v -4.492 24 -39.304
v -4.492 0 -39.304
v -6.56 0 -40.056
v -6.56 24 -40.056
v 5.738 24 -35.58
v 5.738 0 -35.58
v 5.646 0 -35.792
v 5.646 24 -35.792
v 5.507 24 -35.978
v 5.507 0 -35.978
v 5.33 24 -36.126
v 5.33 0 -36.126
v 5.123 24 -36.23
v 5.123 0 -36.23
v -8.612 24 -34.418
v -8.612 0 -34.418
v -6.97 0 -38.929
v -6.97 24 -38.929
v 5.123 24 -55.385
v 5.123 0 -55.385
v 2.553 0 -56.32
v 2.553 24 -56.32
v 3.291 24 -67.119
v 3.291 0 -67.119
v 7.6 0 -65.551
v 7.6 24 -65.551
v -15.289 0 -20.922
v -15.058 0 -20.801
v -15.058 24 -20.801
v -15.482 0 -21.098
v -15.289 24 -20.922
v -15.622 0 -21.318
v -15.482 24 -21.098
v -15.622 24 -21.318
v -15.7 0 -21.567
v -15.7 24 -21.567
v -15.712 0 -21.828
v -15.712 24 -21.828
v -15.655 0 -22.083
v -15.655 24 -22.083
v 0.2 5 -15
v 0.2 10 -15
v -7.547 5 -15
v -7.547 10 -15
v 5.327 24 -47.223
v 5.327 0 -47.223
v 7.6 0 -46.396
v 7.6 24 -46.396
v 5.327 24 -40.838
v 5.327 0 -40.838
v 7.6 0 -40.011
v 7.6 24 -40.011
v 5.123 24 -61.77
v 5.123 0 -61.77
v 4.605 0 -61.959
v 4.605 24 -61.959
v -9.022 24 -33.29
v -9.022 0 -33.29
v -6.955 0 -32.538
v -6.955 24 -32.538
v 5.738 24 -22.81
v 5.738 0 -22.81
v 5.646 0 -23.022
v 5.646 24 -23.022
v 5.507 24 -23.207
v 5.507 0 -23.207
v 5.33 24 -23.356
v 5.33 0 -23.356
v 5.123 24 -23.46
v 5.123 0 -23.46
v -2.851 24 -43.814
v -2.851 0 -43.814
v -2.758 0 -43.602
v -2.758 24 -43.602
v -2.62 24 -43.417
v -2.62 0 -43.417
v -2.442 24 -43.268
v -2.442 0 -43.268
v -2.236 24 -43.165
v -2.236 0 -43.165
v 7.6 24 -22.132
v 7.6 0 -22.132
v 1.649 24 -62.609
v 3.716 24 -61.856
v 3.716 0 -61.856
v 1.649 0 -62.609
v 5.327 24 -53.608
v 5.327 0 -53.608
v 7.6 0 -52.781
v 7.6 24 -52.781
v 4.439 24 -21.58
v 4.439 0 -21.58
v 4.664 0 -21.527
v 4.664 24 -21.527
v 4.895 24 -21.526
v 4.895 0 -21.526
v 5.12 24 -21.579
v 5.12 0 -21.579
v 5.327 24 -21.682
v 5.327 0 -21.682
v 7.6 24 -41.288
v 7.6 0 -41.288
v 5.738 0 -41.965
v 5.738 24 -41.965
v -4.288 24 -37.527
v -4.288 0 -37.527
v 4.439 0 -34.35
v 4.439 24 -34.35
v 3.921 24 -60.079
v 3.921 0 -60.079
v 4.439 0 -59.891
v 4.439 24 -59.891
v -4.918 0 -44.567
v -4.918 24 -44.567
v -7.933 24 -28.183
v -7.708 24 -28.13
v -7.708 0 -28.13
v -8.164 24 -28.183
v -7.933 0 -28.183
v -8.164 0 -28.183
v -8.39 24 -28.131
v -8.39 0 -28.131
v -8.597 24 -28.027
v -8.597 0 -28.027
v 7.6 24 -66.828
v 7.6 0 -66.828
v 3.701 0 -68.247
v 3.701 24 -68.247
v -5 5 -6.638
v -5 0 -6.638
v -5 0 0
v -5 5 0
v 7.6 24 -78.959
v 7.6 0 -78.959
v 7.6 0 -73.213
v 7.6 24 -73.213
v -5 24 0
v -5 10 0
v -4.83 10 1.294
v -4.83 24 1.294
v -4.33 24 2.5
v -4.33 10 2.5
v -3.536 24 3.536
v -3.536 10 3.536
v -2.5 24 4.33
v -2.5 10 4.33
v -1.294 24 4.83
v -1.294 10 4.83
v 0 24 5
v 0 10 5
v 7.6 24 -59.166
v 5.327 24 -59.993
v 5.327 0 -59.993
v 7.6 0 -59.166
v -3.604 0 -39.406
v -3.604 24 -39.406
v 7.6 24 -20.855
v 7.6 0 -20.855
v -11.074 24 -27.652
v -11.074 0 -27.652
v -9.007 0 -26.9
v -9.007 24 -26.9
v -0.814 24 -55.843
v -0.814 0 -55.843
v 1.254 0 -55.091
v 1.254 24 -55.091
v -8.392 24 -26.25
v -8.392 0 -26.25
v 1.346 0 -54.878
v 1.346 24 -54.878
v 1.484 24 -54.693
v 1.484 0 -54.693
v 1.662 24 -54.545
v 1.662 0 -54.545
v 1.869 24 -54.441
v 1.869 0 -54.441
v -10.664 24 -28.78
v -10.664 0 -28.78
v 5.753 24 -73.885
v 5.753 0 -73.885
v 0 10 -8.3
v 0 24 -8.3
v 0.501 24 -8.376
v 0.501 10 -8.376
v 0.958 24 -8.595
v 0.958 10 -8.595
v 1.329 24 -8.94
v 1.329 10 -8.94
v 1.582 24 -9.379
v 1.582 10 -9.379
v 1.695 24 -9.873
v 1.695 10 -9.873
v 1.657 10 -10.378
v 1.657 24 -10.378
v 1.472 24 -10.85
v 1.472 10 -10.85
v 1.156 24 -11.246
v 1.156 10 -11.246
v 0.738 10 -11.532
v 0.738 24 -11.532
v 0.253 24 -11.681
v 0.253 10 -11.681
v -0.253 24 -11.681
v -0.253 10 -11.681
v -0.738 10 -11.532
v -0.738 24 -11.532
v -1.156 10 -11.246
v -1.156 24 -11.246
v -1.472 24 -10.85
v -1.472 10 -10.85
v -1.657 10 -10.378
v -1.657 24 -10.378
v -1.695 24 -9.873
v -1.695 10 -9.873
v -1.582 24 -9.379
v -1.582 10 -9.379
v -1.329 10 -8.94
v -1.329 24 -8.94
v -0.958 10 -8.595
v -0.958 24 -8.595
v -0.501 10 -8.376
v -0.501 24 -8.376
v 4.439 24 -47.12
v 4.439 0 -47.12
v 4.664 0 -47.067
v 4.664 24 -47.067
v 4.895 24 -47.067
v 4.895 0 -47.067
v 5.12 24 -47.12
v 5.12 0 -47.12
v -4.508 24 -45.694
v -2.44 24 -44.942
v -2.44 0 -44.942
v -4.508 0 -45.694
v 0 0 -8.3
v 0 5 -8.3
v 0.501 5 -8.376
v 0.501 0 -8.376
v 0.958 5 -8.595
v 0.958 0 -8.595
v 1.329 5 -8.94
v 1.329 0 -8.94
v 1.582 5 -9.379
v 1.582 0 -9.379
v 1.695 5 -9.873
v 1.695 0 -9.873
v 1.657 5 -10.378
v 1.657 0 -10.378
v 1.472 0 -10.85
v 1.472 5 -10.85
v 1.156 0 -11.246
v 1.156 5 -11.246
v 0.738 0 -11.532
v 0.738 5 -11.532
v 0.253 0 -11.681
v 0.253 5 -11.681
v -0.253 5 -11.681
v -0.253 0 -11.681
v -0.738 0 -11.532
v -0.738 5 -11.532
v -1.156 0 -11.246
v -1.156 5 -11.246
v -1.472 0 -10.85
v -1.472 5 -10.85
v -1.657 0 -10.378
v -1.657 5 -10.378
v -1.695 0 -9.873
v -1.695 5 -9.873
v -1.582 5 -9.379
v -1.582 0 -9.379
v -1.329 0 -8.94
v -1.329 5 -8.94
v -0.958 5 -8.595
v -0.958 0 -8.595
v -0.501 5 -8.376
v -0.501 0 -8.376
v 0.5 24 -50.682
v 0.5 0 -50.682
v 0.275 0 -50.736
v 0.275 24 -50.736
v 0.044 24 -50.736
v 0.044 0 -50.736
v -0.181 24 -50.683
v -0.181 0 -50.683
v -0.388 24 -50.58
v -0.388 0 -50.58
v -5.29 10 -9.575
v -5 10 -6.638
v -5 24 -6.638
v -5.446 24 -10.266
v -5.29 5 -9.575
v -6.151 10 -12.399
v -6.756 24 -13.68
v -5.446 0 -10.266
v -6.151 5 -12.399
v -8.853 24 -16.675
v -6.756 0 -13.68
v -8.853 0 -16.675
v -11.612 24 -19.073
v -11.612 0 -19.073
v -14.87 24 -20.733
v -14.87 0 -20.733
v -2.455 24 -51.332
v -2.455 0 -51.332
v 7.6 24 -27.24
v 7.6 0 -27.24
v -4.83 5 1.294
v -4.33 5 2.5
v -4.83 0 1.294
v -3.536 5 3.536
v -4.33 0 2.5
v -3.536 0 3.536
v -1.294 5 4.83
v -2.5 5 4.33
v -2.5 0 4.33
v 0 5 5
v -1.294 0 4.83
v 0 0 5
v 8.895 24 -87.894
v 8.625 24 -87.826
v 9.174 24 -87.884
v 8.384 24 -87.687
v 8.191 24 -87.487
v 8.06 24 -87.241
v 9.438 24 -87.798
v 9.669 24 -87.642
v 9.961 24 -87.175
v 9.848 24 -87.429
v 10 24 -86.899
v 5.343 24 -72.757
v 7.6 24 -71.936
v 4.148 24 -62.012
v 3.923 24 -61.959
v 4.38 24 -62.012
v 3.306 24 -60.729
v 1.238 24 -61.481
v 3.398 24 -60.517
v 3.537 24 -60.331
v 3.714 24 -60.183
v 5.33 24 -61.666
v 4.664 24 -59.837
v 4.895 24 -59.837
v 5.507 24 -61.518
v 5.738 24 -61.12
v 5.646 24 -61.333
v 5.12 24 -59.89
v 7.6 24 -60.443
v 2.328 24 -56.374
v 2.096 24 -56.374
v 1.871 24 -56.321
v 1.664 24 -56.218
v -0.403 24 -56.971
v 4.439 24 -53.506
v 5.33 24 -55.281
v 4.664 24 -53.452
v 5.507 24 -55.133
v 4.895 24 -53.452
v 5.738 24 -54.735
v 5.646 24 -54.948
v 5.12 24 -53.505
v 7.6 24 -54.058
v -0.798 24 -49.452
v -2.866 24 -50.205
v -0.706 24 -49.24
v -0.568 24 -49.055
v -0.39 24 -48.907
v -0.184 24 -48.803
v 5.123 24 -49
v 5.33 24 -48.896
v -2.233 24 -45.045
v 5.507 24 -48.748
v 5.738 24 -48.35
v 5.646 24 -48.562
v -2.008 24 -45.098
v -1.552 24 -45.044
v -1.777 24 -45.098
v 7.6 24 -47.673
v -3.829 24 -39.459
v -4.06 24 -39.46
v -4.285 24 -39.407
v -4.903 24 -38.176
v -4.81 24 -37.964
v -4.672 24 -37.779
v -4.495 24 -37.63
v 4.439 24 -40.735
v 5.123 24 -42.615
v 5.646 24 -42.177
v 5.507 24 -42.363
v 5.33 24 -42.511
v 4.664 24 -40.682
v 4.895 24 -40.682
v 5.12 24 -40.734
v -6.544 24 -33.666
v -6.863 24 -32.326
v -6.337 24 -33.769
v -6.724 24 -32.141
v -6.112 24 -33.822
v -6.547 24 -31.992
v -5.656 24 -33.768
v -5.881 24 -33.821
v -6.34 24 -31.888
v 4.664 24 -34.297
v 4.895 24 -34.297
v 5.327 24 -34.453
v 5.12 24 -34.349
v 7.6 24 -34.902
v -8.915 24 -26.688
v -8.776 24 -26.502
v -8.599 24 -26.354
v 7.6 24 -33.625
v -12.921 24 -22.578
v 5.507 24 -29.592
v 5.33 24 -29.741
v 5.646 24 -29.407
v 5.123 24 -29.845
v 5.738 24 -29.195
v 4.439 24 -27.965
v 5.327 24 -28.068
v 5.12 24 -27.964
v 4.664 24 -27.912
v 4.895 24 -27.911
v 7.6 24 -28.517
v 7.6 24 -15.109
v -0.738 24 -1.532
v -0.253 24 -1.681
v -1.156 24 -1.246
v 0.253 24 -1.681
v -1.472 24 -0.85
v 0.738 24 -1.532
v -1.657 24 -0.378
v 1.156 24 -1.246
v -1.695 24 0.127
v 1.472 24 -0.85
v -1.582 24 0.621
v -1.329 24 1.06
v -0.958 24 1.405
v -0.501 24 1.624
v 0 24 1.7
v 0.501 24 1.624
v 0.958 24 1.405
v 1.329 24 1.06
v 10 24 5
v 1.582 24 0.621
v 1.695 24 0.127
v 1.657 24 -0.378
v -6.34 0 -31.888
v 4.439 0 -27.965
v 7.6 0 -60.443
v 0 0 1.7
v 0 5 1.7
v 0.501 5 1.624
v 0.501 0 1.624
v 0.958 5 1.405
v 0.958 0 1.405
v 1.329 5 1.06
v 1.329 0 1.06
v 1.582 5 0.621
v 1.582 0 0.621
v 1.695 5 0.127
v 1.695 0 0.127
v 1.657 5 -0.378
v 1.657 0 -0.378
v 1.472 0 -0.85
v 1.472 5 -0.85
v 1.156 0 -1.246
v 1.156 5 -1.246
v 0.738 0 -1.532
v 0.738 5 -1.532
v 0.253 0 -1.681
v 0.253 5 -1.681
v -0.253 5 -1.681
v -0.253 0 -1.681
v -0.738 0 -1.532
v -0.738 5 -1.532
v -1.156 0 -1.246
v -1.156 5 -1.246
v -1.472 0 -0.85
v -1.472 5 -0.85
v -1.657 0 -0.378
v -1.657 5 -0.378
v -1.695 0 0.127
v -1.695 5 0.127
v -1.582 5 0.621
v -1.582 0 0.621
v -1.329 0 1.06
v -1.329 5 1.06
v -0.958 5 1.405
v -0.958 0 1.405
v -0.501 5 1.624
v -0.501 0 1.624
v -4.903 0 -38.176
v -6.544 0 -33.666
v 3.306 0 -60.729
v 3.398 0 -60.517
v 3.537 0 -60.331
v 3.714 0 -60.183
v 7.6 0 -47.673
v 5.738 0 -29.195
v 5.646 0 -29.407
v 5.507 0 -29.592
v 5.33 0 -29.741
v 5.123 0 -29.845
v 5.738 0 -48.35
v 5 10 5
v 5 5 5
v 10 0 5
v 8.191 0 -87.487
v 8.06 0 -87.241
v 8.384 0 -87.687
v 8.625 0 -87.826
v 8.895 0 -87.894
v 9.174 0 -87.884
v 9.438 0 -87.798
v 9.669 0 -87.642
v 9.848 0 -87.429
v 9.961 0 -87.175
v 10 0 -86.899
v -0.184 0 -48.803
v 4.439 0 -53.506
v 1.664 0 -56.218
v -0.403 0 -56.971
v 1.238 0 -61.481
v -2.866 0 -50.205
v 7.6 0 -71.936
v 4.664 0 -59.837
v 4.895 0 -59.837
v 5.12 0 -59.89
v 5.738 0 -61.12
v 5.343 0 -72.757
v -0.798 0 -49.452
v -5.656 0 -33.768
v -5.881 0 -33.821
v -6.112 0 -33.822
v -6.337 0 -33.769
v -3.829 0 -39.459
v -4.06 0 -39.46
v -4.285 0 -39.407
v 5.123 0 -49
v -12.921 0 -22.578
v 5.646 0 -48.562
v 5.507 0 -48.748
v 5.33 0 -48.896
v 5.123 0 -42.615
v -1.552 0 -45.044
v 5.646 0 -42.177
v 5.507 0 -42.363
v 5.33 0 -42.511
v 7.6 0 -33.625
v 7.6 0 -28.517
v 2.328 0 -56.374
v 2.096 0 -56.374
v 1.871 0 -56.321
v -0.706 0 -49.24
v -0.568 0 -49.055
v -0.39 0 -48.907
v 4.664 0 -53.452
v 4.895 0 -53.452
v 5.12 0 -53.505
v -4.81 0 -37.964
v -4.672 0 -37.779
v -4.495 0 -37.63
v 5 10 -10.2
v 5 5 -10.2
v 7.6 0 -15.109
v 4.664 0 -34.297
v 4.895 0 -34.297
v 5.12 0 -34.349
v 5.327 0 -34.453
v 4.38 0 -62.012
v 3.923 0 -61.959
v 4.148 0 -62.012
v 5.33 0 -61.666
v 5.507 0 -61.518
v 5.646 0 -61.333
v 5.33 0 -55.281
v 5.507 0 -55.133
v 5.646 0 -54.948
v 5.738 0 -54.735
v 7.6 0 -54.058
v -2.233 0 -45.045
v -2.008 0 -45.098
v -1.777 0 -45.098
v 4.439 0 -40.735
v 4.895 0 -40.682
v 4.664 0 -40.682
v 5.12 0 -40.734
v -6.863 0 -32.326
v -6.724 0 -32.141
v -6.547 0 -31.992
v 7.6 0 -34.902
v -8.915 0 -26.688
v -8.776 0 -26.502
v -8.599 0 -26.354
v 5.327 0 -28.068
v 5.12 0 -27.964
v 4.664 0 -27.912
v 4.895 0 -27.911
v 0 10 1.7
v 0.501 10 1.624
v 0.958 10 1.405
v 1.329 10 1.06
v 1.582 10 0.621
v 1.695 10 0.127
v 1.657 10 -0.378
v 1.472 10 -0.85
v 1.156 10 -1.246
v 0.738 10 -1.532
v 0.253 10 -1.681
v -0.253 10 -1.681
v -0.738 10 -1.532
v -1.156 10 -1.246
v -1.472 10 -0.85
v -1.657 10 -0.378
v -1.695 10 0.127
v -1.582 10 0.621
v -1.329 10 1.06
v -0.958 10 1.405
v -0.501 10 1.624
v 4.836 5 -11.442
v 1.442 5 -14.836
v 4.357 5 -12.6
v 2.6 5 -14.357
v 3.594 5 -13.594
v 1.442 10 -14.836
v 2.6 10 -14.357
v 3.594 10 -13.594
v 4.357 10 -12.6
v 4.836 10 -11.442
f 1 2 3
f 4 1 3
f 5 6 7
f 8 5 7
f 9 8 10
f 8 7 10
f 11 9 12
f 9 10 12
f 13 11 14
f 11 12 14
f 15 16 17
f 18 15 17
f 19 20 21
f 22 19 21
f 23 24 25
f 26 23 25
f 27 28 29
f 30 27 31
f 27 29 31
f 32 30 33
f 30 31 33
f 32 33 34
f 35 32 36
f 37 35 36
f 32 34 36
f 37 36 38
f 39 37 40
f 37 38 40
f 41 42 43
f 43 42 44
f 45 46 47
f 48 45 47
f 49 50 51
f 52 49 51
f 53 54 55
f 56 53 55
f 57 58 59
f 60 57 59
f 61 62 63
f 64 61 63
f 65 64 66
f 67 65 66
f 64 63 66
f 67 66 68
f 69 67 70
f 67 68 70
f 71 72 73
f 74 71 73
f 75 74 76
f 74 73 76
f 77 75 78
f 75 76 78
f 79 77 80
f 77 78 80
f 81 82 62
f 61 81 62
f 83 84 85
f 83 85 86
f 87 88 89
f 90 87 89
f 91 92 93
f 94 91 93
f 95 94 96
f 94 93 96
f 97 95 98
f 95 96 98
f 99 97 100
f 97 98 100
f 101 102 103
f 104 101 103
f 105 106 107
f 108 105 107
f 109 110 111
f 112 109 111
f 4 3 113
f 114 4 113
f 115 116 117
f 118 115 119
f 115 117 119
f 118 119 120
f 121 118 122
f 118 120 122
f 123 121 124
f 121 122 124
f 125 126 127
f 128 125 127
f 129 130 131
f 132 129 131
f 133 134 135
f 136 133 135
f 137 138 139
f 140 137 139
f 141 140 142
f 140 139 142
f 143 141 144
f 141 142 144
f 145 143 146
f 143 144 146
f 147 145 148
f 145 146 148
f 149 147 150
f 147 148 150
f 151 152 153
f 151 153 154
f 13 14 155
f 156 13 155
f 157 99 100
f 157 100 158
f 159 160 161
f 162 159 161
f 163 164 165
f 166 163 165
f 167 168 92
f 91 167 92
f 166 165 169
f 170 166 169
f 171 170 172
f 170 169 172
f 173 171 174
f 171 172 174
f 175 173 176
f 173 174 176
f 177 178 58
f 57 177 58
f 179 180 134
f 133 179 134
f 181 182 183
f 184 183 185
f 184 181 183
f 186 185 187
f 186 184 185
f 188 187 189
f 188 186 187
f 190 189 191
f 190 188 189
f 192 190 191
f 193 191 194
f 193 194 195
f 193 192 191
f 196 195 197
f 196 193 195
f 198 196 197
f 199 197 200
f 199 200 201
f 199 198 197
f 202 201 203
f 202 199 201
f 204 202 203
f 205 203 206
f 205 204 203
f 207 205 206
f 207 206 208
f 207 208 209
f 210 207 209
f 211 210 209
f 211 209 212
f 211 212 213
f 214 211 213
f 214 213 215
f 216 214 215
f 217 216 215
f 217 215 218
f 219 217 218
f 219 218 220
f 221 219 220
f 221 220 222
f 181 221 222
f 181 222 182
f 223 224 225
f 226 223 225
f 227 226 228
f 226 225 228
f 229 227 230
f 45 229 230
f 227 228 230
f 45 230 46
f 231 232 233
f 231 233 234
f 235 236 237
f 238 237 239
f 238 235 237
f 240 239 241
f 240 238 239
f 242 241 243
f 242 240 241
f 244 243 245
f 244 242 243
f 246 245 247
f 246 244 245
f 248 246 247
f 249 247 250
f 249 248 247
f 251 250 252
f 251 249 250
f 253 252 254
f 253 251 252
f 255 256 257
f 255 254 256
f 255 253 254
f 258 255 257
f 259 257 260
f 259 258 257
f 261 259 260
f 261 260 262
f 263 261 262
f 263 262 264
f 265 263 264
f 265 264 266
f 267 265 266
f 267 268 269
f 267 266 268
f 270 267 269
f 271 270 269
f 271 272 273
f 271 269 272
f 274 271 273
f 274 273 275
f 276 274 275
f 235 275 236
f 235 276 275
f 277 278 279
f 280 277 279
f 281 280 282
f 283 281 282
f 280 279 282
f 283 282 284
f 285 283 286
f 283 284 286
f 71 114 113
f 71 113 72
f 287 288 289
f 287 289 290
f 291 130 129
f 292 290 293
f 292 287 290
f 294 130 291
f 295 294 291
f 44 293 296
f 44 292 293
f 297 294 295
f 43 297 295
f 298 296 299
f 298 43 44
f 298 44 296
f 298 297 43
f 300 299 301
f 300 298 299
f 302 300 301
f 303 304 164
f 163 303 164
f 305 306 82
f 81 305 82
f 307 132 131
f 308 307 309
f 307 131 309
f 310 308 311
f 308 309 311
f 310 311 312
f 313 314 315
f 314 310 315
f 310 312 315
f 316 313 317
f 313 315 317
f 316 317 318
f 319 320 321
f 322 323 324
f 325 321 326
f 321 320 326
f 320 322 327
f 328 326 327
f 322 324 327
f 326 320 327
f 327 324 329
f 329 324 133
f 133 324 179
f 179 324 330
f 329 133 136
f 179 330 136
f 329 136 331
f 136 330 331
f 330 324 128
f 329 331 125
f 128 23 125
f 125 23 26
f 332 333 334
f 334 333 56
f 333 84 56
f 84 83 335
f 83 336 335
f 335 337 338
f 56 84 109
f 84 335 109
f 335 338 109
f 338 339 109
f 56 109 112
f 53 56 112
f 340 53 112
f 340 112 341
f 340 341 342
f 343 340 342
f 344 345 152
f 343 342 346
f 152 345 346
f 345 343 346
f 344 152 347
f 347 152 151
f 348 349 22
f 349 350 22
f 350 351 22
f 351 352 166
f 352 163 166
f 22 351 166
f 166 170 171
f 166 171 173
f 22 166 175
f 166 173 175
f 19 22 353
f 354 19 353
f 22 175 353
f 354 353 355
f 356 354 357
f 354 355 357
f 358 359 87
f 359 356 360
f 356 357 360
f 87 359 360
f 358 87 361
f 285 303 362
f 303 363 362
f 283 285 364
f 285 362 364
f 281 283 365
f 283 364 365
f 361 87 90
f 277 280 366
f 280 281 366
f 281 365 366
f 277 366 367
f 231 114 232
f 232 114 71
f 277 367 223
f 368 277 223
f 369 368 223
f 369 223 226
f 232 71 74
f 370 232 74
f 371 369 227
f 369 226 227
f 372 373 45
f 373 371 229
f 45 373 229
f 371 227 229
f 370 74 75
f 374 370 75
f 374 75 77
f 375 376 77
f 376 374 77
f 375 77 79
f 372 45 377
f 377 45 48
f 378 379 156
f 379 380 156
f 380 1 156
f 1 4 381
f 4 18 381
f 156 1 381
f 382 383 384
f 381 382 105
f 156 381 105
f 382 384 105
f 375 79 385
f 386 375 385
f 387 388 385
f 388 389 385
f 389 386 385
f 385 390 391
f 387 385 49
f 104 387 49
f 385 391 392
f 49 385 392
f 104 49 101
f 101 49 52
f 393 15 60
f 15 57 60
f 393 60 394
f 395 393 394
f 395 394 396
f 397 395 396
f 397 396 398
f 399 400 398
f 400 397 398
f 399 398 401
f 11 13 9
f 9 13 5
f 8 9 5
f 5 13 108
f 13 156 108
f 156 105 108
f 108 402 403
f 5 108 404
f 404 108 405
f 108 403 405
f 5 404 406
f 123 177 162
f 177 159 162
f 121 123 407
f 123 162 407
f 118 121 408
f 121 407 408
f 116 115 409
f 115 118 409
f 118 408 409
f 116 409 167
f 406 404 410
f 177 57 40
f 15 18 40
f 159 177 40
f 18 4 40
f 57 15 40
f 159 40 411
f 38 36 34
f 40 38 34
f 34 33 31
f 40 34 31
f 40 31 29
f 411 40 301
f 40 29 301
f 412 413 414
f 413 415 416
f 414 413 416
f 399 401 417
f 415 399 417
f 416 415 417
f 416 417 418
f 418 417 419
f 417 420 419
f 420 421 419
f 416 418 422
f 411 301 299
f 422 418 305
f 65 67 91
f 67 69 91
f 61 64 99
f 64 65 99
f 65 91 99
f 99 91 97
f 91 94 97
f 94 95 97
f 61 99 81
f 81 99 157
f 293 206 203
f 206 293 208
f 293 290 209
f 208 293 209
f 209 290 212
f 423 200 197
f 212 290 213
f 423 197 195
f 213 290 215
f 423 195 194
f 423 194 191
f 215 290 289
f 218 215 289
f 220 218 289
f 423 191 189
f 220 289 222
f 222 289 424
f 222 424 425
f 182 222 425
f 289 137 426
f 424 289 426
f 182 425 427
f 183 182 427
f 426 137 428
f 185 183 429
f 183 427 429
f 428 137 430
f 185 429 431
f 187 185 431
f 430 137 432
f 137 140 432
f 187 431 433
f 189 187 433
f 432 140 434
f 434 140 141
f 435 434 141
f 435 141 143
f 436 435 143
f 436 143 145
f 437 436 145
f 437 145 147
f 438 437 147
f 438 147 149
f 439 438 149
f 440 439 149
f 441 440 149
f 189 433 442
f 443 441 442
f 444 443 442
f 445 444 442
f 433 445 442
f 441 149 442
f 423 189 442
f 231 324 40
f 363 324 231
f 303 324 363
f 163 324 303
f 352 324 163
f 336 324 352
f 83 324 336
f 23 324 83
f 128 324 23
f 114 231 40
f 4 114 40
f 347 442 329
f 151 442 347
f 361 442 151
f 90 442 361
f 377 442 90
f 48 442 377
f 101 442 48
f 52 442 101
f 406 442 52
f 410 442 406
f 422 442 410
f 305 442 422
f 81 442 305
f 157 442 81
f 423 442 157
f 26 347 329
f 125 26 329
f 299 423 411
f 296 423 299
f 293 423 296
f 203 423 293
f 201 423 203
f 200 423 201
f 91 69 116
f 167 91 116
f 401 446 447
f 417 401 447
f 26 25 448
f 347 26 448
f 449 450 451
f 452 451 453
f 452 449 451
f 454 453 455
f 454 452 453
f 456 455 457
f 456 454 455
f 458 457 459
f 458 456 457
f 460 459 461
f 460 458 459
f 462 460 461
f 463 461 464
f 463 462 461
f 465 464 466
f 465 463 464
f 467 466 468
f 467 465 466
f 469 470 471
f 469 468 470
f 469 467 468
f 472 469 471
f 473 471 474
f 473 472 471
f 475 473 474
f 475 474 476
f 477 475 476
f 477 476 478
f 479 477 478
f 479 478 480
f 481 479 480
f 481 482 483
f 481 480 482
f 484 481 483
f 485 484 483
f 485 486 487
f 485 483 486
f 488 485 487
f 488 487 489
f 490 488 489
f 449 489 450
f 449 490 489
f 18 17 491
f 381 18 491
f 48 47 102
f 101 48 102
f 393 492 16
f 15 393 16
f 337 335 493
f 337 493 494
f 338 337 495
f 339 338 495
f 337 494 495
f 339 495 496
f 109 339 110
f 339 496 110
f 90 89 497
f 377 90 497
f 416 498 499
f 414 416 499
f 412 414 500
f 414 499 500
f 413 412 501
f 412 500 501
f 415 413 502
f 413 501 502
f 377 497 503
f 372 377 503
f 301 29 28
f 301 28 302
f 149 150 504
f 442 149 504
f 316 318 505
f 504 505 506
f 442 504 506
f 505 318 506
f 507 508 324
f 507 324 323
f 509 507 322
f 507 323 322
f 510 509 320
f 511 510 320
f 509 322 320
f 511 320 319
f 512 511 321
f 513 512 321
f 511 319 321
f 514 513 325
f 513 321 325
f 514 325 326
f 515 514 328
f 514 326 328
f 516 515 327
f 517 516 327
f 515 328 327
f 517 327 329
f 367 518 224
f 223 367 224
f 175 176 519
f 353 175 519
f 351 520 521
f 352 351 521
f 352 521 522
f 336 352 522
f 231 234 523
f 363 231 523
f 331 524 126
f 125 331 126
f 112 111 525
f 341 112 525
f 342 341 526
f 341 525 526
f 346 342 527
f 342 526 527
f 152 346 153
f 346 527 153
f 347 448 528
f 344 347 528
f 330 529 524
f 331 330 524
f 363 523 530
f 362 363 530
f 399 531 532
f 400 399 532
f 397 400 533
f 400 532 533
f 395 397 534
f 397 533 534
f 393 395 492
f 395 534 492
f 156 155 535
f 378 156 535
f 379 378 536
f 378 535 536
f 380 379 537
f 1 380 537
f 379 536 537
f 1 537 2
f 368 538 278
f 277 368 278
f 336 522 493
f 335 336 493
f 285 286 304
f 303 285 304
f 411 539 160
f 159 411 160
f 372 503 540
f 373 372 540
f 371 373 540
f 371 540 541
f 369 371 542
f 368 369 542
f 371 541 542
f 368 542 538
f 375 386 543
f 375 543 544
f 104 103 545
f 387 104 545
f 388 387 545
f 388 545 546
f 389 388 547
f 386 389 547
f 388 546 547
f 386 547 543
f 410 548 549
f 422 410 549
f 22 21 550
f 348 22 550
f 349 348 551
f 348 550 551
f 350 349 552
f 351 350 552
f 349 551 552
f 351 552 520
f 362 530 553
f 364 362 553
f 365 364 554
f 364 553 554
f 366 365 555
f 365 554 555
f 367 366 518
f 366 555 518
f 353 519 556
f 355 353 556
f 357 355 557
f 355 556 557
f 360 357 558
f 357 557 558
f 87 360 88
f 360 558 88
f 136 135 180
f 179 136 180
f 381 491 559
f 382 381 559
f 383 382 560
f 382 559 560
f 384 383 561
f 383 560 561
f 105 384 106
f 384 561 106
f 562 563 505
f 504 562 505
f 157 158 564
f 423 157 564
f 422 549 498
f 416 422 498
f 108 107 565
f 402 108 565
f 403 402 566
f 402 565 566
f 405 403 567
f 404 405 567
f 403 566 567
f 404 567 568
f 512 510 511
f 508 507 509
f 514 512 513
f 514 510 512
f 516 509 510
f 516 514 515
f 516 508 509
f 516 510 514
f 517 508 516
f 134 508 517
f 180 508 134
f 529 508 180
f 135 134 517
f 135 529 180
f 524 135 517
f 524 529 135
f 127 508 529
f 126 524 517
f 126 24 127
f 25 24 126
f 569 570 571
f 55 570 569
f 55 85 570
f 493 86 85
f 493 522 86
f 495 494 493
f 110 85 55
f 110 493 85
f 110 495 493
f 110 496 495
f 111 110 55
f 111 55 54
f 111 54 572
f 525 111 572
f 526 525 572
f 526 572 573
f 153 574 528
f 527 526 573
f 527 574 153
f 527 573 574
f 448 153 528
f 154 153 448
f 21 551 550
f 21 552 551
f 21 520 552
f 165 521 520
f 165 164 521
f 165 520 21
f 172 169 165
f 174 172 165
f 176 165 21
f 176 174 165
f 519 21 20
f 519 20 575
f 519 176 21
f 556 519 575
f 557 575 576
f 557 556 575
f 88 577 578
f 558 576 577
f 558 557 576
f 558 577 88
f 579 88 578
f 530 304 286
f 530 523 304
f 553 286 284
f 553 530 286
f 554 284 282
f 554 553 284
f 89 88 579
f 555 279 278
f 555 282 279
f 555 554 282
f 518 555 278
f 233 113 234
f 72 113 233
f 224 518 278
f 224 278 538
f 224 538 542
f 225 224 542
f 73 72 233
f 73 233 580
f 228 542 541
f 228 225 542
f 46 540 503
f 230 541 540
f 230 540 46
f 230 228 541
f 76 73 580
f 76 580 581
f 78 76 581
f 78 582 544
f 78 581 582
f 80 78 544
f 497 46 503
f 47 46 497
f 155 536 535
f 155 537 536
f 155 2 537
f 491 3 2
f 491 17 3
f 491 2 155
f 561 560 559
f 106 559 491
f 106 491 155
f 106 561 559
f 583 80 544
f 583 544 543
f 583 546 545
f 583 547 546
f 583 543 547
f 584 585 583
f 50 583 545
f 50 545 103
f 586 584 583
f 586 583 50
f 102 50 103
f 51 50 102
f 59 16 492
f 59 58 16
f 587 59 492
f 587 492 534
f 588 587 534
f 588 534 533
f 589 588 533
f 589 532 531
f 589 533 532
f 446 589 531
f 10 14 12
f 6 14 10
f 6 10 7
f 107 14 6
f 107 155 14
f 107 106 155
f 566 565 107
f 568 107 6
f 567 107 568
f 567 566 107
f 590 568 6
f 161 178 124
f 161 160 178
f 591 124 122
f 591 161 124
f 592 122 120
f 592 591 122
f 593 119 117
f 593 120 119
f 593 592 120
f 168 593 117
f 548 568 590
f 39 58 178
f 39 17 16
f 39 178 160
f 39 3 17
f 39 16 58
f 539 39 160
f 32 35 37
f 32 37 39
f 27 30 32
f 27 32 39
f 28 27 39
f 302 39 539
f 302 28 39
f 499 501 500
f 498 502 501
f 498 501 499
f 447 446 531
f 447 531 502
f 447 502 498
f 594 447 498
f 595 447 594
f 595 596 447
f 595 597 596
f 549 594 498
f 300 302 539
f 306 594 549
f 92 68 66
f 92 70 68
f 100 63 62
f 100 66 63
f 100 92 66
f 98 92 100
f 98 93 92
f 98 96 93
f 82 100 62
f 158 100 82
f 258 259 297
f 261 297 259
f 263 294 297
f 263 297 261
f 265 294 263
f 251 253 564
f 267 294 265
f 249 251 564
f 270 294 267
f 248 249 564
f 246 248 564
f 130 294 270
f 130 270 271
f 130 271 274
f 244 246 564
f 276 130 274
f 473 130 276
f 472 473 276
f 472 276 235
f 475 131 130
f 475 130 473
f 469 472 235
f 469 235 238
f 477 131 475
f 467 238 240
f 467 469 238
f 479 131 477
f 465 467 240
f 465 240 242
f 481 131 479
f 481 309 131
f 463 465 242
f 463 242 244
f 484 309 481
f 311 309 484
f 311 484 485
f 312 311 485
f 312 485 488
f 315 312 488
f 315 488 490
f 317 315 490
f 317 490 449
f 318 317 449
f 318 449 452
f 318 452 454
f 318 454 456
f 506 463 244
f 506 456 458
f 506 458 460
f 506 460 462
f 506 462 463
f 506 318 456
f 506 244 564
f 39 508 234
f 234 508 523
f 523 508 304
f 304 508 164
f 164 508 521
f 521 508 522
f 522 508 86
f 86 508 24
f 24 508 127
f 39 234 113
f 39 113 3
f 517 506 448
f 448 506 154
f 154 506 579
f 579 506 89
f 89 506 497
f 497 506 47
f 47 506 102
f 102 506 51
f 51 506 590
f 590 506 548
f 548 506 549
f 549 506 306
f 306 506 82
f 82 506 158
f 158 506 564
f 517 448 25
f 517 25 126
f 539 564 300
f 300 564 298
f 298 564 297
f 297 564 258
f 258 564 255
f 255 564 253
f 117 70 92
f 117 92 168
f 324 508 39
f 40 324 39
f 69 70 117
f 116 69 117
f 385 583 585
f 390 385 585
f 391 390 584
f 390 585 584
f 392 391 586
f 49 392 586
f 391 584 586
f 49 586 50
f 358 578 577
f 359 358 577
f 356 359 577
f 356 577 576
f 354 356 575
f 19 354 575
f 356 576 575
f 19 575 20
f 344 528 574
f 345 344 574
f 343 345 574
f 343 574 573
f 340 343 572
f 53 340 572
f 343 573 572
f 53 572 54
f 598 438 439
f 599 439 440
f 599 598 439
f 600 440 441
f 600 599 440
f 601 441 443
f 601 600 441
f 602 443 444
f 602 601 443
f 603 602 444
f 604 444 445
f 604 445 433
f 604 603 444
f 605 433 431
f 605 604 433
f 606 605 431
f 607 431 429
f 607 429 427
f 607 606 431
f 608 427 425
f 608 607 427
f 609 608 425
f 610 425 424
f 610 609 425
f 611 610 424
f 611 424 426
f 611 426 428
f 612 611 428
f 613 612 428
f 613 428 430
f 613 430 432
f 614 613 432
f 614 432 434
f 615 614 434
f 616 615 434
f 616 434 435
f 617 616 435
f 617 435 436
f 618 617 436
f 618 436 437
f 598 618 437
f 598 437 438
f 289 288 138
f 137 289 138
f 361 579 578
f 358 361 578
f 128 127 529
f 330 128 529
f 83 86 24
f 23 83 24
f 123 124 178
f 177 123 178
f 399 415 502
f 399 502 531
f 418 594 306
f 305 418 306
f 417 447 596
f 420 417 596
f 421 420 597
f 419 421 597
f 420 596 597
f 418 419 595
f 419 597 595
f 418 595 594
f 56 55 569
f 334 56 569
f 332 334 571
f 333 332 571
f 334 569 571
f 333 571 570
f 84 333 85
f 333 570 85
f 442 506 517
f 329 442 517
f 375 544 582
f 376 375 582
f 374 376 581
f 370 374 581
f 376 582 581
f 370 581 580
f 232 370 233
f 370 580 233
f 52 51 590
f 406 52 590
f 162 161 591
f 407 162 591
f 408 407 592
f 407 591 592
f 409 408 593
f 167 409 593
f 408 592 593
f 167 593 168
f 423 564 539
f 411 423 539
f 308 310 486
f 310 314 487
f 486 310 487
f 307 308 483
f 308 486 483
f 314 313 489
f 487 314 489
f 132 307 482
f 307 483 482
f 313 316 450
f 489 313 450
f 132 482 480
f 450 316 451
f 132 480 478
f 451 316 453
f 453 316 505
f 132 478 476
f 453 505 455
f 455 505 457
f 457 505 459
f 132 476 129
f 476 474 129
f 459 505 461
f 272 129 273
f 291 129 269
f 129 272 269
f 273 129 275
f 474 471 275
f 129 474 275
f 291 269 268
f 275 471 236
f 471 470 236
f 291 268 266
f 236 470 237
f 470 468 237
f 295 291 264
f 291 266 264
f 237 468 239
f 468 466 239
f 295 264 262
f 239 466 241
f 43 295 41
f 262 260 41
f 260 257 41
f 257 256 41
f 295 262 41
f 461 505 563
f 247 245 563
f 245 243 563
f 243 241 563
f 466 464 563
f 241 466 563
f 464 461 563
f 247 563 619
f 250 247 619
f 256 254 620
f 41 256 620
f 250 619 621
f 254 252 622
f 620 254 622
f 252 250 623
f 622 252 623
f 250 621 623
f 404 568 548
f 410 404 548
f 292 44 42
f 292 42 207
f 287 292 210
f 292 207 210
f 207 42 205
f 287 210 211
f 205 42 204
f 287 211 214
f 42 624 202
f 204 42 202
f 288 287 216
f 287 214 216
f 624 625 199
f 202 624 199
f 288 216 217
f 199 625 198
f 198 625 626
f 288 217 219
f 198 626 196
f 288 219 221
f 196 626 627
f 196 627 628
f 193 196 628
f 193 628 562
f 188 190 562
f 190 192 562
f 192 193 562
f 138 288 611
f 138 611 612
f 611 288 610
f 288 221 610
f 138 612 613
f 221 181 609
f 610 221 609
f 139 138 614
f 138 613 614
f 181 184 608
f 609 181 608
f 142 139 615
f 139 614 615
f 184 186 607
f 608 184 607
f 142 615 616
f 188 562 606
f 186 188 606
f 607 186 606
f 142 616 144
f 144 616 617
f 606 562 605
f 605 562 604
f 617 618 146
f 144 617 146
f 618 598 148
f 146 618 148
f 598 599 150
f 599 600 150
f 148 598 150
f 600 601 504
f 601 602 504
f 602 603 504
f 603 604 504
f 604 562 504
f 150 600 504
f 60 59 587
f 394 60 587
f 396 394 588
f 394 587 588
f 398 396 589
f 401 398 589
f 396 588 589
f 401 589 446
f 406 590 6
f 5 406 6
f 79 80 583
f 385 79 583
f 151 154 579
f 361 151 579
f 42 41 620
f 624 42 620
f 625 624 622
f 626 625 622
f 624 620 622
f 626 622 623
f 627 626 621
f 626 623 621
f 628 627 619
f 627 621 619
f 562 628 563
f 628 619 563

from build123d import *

# Parameters (mm, degrees)
SKETCH_1_R          = 1.7
EXTRUDE_1_DEPTH     = 24
CUT_EXTRUDE_START   = -5
SKETCH_2_R          = 1.7
CUT_EXTRUDE_1_DEPTH = 5
FILLET_1_R          = 1
FILLET_2_R          = 15


with BuildPart() as part:
    # 草图1 → 凸台-拉伸1 (new body)
    with BuildSketch(Plane(origin=(0, 0, 0), x_dir=(1, 0, 0), z_dir=(0, 1, 0))):
        with BuildLine():
            Line((-5, 17.140740034), (-5, 0))
            ThreePointArc((-5, 0), (-3.535533906, -3.535533906), (0, -5))
            Line((0, -5), (10, -5))
            Line((10, -5), (10, 92.570484452))
            Line((10, 92.570484452), (-15.997319233, 21.143436891))
            Line((-15.997319233, 21.143436891), (-5, 17.140740034))
        make_face()
        with Locations(Location((0, 0, 0), (0, 0, 270))):
            Circle(SKETCH_1_R, mode=Mode.SUBTRACT)
        with Locations(Location((0, 10, 0), (0, 0, 270))):
            Circle(SKETCH_1_R, mode=Mode.SUBTRACT)
        with BuildLine():
            Line((7.6, 15.108741736), (-12.9212086, 22.577850837))
            Line((-12.9212086, 22.577850837), (-11.074299826, 27.65219099))
            Line((-11.074299826, 27.65219099), (-9.00697606, 26.899746674))
            ThreePointArc((-9.00697606, 26.899746674), (-8.776165309, 26.502415559), (-8.392030021, 26.250253511))
            Line((-8.392030021, 26.250253511), (4.438901994, 21.58017618))
            ThreePointArc((4.438901994, 21.58017618), (4.895253337, 21.526426111), (5.327464148, 21.682437114))
            Line((5.327464148, 21.682437114), (7.6, 20.855301707))
            Line((7.6, 20.855301707), (7.6, 15.108741736))
        make_face(mode=Mode.SUBTRACT)
        with BuildLine():
            ThreePointArc((5.73788832, 22.810068259), (5.507077569, 23.207399374), (5.122942281, 23.459561422))
            Line((5.122942281, 23.459561422), (-7.707989734, 28.129638753))
            ThreePointArc((-7.707989734, 28.129638753), (-8.164341077, 28.183388821), (-8.596551888, 28.027377819))
            Line((-8.596551888, 28.027377819), (-10.663875654, 28.779822134))
            Line((-10.663875654, 28.779822134), (-9.022178966, 33.290346714))
            Line((-9.022178966, 33.290346714), (-6.9548552, 32.537902399))
            ThreePointArc((-6.9548552, 32.537902399), (-6.724044449, 32.140571284), (-6.339909161, 31.888409236))
            Line((-6.339909161, 31.888409236), (4.438901994, 27.965242815))
            ThreePointArc((4.438901994, 27.965242815), (4.895253337, 27.911492746), (5.327464148, 28.067503748))
            Line((5.327464148, 28.067503748), (7.6, 27.240368342))
            Line((7.6, 27.240368342), (7.6, 22.132315034))
            Line((7.6, 22.132315034), (5.73788832, 22.810068259))
        make_face(mode=Mode.SUBTRACT)
        with BuildLine():
            ThreePointArc((5.73788832, 29.195134893), (5.507077569, 29.592466009), (5.122942281, 29.844628056))
            Line((5.122942281, 29.844628056), (-5.655868874, 33.767794478))
            ThreePointArc((-5.655868874, 33.767794478), (-6.112220217, 33.821544546), (-6.544431028, 33.665533544))
            Line((-6.544431028, 33.665533544), (-8.611754794, 34.417977859))
            Line((-8.611754794, 34.417977859), (-6.970058106, 38.928502439))
            Line((-6.970058106, 38.928502439), (-4.90273434, 38.176058124))
            ThreePointArc((-4.90273434, 38.176058124), (-4.671923589, 37.778727008), (-4.287788301, 37.526564961))
            Line((-4.287788301, 37.526564961), (4.438901994, 34.35030945))
            ThreePointArc((4.438901994, 34.35030945), (4.895253337, 34.296559381), (5.327464148, 34.452570383))
            Line((5.327464148, 34.452570383), (7.6, 33.625434977))
            Line((7.6, 33.625434977), (7.6, 28.517381669))
            Line((7.6, 28.517381669), (5.73788832, 29.195134893))
        make_face(mode=Mode.SUBTRACT)
        with BuildLine():
            ThreePointArc((5.73788832, 35.580201528), (5.507077569, 35.977532644), (5.122942281, 36.229694691))
            Line((5.122942281, 36.229694691), (-3.603748014, 39.405950202))
            ThreePointArc((-3.603748014, 39.405950202), (-4.060099357, 39.459700271), (-4.492310168, 39.303689269))
            Line((-4.492310168, 39.303689269), (-6.559633934, 40.056133584))
            Line((-6.559633934, 40.056133584), (-4.917937246, 44.566658164))
            Line((-4.917937246, 44.566658164), (-2.85061348, 43.814213848))
            ThreePointArc((-2.85061348, 43.814213848), (-2.619802729, 43.416882733), (-2.235667441, 43.164720685))
            Line((-2.235667441, 43.164720685), (4.438901994, 40.735376085))
            ThreePointArc((4.438901994, 40.735376085), (4.895253337, 40.681626016), (5.327464148, 40.837637018))
            Line((5.327464148, 40.837637018), (7.6, 40.010501612))
            Line((7.6, 40.010501612), (7.6, 34.902448304))
            Line((7.6, 34.902448304), (5.73788832, 35.580201528))
        make_face(mode=Mode.SUBTRACT)
        with BuildLine():
            ThreePointArc((5.73788832, 41.965268163), (5.507077569, 42.362599278), (5.122942281, 42.614761326))
            Line((5.122942281, 42.614761326), (-1.551627154, 45.044105927))
            ThreePointArc((-1.551627154, 45.044105927), (-2.007978497, 45.097855995), (-2.440189308, 44.941844993))
            Line((-2.440189308, 44.941844993), (-4.507513074, 45.694289309))
            Line((-4.507513074, 45.694289309), (-2.865816386, 50.204813888))
            Line((-2.865816386, 50.204813888), (-0.79849262, 49.452369573))
            ThreePointArc((-0.79849262, 49.452369573), (-0.567681869, 49.055038458), (-0.183546581, 48.80287641))
            Line((-0.183546581, 48.80287641), (4.438901994, 47.120442719))
            ThreePointArc((4.438901994, 47.120442719), (4.895253337, 47.066692651), (5.327464148, 47.222703653))
            Line((5.327464148, 47.222703653), (7.6, 46.395568247))
            Line((7.6, 46.395568247), (7.6, 41.287514939))
            Line((7.6, 41.287514939), (5.73788832, 41.965268163))
        make_face(mode=Mode.SUBTRACT)
        with BuildLine():
            ThreePointArc((5.73788832, 48.350334798), (5.507077569, 48.747665913), (5.122942281, 48.999827961))
            Line((5.122942281, 48.999827961), (0.500493706, 50.682261652))
            ThreePointArc((0.500493706, 50.682261652), (0.044142363, 50.73601172), (-0.388068448, 50.580000718))
            Line((-0.388068448, 50.580000718), (-2.455392214, 51.332445033))
            Line((-2.455392214, 51.332445033), (-0.813695526, 55.842969613))
            Line((-0.813695526, 55.842969613), (1.25362824, 55.090525298))
            ThreePointArc((1.25362824, 55.090525298), (1.484438991, 54.693194182), (1.868574279, 54.441032135))
            Line((1.868574279, 54.441032135), (4.438901994, 53.505509354))
            ThreePointArc((4.438901994, 53.505509354), (4.895253337, 53.451759286), (5.327464148, 53.607770288))
            Line((5.327464148, 53.607770288), (7.6, 52.780634882))
            Line((7.6, 52.780634882), (7.6, 47.672581574))
            Line((7.6, 47.672581574), (5.73788832, 48.350334798))
        make_face(mode=Mode.SUBTRACT)
        with BuildLine():
            ThreePointArc((5.73788832, 54.735401433), (5.507077569, 55.132732548), (5.122942281, 55.384894596))
            Line((5.122942281, 55.384894596), (2.552614566, 56.320417376))
            ThreePointArc((2.552614566, 56.320417376), (2.096263223, 56.374167445), (1.664052412, 56.218156443))
            Line((1.664052412, 56.218156443), (-0.403271354, 56.970600758))
            Line((-0.403271354, 56.970600758), (1.238425334, 61.481125338))
            Line((1.238425334, 61.481125338), (3.3057491, 60.728681023))
            ThreePointArc((3.3057491, 60.728681023), (3.536559851, 60.331349907), (3.920695139, 60.07918786))
            Line((3.920695139, 60.07918786), (4.438901994, 59.890575989))
            ThreePointArc((4.438901994, 59.890575989), (4.895253337, 59.836825921), (5.327464148, 59.992836923))
            Line((5.327464148, 59.992836923), (7.6, 59.165701516))
            Line((7.6, 59.165701516), (7.6, 54.057648209))
            Line((7.6, 54.057648209), (5.73788832, 54.735401433))
        make_face(mode=Mode.SUBTRACT)
        with BuildLine():
            ThreePointArc((5.73788832, 61.120468068), (5.507077569, 61.517799183), (5.122942281, 61.769961231))
            Line((5.122942281, 61.769961231), (4.604735426, 61.958573101))
            ThreePointArc((4.604735426, 61.958573101), (4.148384083, 62.01232317), (3.716173272, 61.856312167))
            Line((3.716173272, 61.856312167), (1.648849506, 62.608756483))
            Line((1.648849506, 62.608756483), (3.290546194, 67.119281063))
            Line((3.290546194, 67.119281063), (7.6, 65.550768151))
            Line((7.6, 65.550768151), (7.6, 60.442714843))
            Line((7.6, 60.442714843), (5.73788832, 61.120468068))
        make_face(mode=Mode.SUBTRACT)
        Polygon((3.700970366, 68.246912207), (5.342667054, 72.757436787), (7.6, 71.935834786), (7.6, 66.827781478), align=None, mode=Mode.SUBTRACT)
        Polygon((5.753091226, 73.885067932), (7.6, 78.959408084), (7.6, 73.212848113), align=None, mode=Mode.SUBTRACT)
    extrude(amount=EXTRUDE_1_DEPTH)

    # 草图2 → 切除-拉伸1 (cut)
    with BuildSketch(Plane.XZ.offset(CUT_EXTRUDE_START)):
        with BuildLine():
            Line((-5, 5), (-5, -15))
            Line((-5, -15), (0.2, -15))
            ThreePointArc((0.2, -15), (3.59411255, -13.59411255), (5, -10.2))
            Line((5, -10.2), (5, 5))
            Line((5, 5), (-5, 5))
        make_face()
        with Locations(Location((0, -10, 0), (0, 0, 270))):
            Circle(SKETCH_2_R, mode=Mode.SUBTRACT)
        with Locations(Location((0, 0, 0), (0, 0, 270))):
            Circle(SKETCH_2_R, mode=Mode.SUBTRACT)
    extrude(amount=-CUT_EXTRUDE_1_DEPTH, mode=Mode.SUBTRACT)

    # 圆角1
    fillet_1_edges = [part.edges().sort_by_distance(p)[0] for p in [
        (-15.997319233, 12, -21.143436891),
        (10, 12, -92.570484452),
    ]]
    fillet(fillet_1_edges, radius=FILLET_1_R)

    # 圆角2
    # the kernel refuses this fillet: 15 mm, written as the material it adds along each edge
    with BuildSketch(Plane(origin=(-5, 0, -17.140740034), x_dir=(-0.9396926207859102, 0, -0.34202014332566355), z_dir=(0, 1, 0))) as fillet_2_piece_1_section:
        with BuildLine():
            CenterArc((FILLET_2_R * 0.70020753821, FILLET_2_R), FILLET_2_R, 200, 70)
            Line((-FILLET_2_R * 0.239485082576, FILLET_2_R * 0.657979856674), (0, 0))
            Line((0, 0), (FILLET_2_R * 0.70020753821, 0))
        make_face()
    fillet_2_piece_1 = extrude(amount=24, mode=Mode.PRIVATE)
    fillet_2_piece_1 = split(fillet_2_piece_1, bisect_by=Plane(origin=(-8.067749686, 5, -17.400247016), z_dir=(0, -1, 0)), keep=Keep.TOP, mode=Mode.PRIVATE)
    fillet_2_piece_1 = split(fillet_2_piece_1, bisect_by=Plane(origin=(-8.067749686, 2.5, -15), z_dir=(0, 0, -1)), keep=Keep.TOP, mode=Mode.PRIVATE)
    add(fillet_2_piece_1)
    with BuildSketch(Plane(origin=(-5, 0, -17.140740034), x_dir=(-0.9396926207859102, 0, -0.34202014332566355), z_dir=(0, 1, 0))) as fillet_2_piece_2_section:
        with BuildLine():
            CenterArc((FILLET_2_R * 0.70020753821, FILLET_2_R), FILLET_2_R, 200, 70)
            Line((-FILLET_2_R * 0.239485082576, FILLET_2_R * 0.657979856674), (0, 0))
            Line((0, 0), (FILLET_2_R * 0.70020753821, 0))
        make_face()
    fillet_2_piece_2 = extrude(amount=24, mode=Mode.PRIVATE)
    fillet_2_piece_2 = split(fillet_2_piece_2, bisect_by=Plane(origin=(-5.50966696, 5, -12.375604979), z_dir=(0, -1, 0)), keep=Keep.TOP, mode=Mode.PRIVATE)
    fillet_2_piece_2 = split(fillet_2_piece_2, bisect_by=Plane(origin=(-5.50966696, 2.5, -15), z_dir=(0, 0, 1)), keep=Keep.TOP, mode=Mode.PRIVATE)
    add(fillet_2_piece_2)
    with BuildSketch(Plane(origin=(-5, 0, -17.140740034), x_dir=(-0.9396926207859102, 0, -0.34202014332566355), z_dir=(0, 1, 0))) as fillet_2_piece_3_section:
        with BuildLine():
            CenterArc((FILLET_2_R * 0.70020753821, FILLET_2_R), FILLET_2_R, 200, 70)
            Line((-FILLET_2_R * 0.239485082576, FILLET_2_R * 0.657979856674), (0, 0))
            Line((0, 0), (FILLET_2_R * 0.70020753821, 0))
        make_face()
    fillet_2_piece_3 = extrude(amount=24, mode=Mode.PRIVATE)
    fillet_2_piece_3 = split(fillet_2_piece_3, bisect_by=Plane(origin=(-8.067749686, 5, -17.400247016), z_dir=(0, 1, 0)), keep=Keep.TOP, mode=Mode.PRIVATE)
    fillet_2_piece_3 = split(fillet_2_piece_3, bisect_by=Plane(origin=(-8.067749686, 7.5, -15), z_dir=(0, 0, -1)), keep=Keep.TOP, mode=Mode.PRIVATE)
    fillet_2_piece_3 = split(fillet_2_piece_3, bisect_by=Plane(origin=(-8.067749686, 10, -17.400247016), z_dir=(0, -1, 0)), keep=Keep.TOP, mode=Mode.PRIVATE)
    add(fillet_2_piece_3)
    with BuildSketch(Plane(origin=(-5, 0, -17.140740034), x_dir=(-0.9396926207859102, 0, -0.34202014332566355), z_dir=(0, 1, 0))) as fillet_2_piece_4_section:
        with BuildLine():
            CenterArc((FILLET_2_R * 0.70020753821, FILLET_2_R), FILLET_2_R, 200, 70)
            Line((-FILLET_2_R * 0.239485082576, FILLET_2_R * 0.657979856674), (0, 0))
            Line((0, 0), (FILLET_2_R * 0.70020753821, 0))
        make_face()
    fillet_2_piece_4 = extrude(amount=24, mode=Mode.PRIVATE)
    fillet_2_piece_4 = split(fillet_2_piece_4, bisect_by=Plane(origin=(-8.067749686, 17, -15), z_dir=(0, 0, -1)), keep=Keep.TOP, mode=Mode.PRIVATE)
    fillet_2_piece_4 = split(fillet_2_piece_4, bisect_by=Plane(origin=(-8.067749686, 10, -17.400247016), z_dir=(0, 1, 0)), keep=Keep.TOP, mode=Mode.PRIVATE)
    add(fillet_2_piece_4)
    with BuildSketch(Plane(origin=(-5, 0, -17.140740034), x_dir=(-0.9396926207859102, 0, -0.34202014332566355), z_dir=(0, 1, 0))) as fillet_2_piece_5_section:
        with BuildLine():
            CenterArc((FILLET_2_R * 0.70020753821, FILLET_2_R), FILLET_2_R, 200, 70)
            Line((-FILLET_2_R * 0.239485082576, FILLET_2_R * 0.657979856674), (0, 0))
            Line((0, 0), (FILLET_2_R * 0.70020753821, 0))
        make_face()
    fillet_2_piece_5 = extrude(amount=24, mode=Mode.PRIVATE)
    fillet_2_piece_5 = split(fillet_2_piece_5, bisect_by=Plane(origin=(-5.50966696, 17, -15), z_dir=(0, 0, 1)), keep=Keep.TOP, mode=Mode.PRIVATE)
    fillet_2_piece_5 = split(fillet_2_piece_5, bisect_by=Plane(origin=(-5.50966696, 10, -12.375604979), z_dir=(0, 1, 0)), keep=Keep.TOP, mode=Mode.PRIVATE)
    add(fillet_2_piece_5)


solid = part.part
